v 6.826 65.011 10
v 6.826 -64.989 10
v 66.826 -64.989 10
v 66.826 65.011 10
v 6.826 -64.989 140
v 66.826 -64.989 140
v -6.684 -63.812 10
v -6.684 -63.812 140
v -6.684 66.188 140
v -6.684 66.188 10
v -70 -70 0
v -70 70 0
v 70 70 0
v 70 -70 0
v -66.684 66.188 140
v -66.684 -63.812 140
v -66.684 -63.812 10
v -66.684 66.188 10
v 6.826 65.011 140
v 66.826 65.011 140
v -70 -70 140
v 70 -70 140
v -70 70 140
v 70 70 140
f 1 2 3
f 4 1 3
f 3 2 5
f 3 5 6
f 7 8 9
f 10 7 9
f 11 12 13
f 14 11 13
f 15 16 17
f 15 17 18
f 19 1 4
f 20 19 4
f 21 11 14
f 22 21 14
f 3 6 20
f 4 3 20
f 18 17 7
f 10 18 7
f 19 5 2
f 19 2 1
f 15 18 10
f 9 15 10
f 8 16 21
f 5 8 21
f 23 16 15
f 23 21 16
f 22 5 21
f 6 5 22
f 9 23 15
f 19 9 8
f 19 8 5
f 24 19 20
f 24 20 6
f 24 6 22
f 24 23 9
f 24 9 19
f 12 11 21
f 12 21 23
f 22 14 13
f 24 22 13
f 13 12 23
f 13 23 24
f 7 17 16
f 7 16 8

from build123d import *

# Parameters (mm, degrees)
F0_W     = 140
F0_H     = 140
F1_DEPTH = 140
F2_W     = 60
F2_H     = 130
F4_DEPTH = 130
F3_W     = 60
F3_H     = 130
F5_DEPTH = 130


with BuildPart() as f1:
    # F0 (on Top) → F1 (new body)
    with BuildSketch(Plane.XY):
        Rectangle(F0_W, F0_H)
    extrude(amount=F1_DEPTH)

    # F2 (on face) → F4 (cut)
    with BuildSketch(Plane.XY.offset(140)):
        with Locations((36.825541, 0.010989)):
            Rectangle(F2_W, F2_H)
    extrude(amount=-F4_DEPTH, mode=Mode.SUBTRACT)

    # F3 (on face) → F5 (cut)
    with BuildSketch(Plane.XY.offset(140)):
        with Locations((-36.683903, 1.187629)):
            Rectangle(F3_W, F3_H)
    extrude(amount=-F5_DEPTH, mode=Mode.SUBTRACT)


solid = f1.part
